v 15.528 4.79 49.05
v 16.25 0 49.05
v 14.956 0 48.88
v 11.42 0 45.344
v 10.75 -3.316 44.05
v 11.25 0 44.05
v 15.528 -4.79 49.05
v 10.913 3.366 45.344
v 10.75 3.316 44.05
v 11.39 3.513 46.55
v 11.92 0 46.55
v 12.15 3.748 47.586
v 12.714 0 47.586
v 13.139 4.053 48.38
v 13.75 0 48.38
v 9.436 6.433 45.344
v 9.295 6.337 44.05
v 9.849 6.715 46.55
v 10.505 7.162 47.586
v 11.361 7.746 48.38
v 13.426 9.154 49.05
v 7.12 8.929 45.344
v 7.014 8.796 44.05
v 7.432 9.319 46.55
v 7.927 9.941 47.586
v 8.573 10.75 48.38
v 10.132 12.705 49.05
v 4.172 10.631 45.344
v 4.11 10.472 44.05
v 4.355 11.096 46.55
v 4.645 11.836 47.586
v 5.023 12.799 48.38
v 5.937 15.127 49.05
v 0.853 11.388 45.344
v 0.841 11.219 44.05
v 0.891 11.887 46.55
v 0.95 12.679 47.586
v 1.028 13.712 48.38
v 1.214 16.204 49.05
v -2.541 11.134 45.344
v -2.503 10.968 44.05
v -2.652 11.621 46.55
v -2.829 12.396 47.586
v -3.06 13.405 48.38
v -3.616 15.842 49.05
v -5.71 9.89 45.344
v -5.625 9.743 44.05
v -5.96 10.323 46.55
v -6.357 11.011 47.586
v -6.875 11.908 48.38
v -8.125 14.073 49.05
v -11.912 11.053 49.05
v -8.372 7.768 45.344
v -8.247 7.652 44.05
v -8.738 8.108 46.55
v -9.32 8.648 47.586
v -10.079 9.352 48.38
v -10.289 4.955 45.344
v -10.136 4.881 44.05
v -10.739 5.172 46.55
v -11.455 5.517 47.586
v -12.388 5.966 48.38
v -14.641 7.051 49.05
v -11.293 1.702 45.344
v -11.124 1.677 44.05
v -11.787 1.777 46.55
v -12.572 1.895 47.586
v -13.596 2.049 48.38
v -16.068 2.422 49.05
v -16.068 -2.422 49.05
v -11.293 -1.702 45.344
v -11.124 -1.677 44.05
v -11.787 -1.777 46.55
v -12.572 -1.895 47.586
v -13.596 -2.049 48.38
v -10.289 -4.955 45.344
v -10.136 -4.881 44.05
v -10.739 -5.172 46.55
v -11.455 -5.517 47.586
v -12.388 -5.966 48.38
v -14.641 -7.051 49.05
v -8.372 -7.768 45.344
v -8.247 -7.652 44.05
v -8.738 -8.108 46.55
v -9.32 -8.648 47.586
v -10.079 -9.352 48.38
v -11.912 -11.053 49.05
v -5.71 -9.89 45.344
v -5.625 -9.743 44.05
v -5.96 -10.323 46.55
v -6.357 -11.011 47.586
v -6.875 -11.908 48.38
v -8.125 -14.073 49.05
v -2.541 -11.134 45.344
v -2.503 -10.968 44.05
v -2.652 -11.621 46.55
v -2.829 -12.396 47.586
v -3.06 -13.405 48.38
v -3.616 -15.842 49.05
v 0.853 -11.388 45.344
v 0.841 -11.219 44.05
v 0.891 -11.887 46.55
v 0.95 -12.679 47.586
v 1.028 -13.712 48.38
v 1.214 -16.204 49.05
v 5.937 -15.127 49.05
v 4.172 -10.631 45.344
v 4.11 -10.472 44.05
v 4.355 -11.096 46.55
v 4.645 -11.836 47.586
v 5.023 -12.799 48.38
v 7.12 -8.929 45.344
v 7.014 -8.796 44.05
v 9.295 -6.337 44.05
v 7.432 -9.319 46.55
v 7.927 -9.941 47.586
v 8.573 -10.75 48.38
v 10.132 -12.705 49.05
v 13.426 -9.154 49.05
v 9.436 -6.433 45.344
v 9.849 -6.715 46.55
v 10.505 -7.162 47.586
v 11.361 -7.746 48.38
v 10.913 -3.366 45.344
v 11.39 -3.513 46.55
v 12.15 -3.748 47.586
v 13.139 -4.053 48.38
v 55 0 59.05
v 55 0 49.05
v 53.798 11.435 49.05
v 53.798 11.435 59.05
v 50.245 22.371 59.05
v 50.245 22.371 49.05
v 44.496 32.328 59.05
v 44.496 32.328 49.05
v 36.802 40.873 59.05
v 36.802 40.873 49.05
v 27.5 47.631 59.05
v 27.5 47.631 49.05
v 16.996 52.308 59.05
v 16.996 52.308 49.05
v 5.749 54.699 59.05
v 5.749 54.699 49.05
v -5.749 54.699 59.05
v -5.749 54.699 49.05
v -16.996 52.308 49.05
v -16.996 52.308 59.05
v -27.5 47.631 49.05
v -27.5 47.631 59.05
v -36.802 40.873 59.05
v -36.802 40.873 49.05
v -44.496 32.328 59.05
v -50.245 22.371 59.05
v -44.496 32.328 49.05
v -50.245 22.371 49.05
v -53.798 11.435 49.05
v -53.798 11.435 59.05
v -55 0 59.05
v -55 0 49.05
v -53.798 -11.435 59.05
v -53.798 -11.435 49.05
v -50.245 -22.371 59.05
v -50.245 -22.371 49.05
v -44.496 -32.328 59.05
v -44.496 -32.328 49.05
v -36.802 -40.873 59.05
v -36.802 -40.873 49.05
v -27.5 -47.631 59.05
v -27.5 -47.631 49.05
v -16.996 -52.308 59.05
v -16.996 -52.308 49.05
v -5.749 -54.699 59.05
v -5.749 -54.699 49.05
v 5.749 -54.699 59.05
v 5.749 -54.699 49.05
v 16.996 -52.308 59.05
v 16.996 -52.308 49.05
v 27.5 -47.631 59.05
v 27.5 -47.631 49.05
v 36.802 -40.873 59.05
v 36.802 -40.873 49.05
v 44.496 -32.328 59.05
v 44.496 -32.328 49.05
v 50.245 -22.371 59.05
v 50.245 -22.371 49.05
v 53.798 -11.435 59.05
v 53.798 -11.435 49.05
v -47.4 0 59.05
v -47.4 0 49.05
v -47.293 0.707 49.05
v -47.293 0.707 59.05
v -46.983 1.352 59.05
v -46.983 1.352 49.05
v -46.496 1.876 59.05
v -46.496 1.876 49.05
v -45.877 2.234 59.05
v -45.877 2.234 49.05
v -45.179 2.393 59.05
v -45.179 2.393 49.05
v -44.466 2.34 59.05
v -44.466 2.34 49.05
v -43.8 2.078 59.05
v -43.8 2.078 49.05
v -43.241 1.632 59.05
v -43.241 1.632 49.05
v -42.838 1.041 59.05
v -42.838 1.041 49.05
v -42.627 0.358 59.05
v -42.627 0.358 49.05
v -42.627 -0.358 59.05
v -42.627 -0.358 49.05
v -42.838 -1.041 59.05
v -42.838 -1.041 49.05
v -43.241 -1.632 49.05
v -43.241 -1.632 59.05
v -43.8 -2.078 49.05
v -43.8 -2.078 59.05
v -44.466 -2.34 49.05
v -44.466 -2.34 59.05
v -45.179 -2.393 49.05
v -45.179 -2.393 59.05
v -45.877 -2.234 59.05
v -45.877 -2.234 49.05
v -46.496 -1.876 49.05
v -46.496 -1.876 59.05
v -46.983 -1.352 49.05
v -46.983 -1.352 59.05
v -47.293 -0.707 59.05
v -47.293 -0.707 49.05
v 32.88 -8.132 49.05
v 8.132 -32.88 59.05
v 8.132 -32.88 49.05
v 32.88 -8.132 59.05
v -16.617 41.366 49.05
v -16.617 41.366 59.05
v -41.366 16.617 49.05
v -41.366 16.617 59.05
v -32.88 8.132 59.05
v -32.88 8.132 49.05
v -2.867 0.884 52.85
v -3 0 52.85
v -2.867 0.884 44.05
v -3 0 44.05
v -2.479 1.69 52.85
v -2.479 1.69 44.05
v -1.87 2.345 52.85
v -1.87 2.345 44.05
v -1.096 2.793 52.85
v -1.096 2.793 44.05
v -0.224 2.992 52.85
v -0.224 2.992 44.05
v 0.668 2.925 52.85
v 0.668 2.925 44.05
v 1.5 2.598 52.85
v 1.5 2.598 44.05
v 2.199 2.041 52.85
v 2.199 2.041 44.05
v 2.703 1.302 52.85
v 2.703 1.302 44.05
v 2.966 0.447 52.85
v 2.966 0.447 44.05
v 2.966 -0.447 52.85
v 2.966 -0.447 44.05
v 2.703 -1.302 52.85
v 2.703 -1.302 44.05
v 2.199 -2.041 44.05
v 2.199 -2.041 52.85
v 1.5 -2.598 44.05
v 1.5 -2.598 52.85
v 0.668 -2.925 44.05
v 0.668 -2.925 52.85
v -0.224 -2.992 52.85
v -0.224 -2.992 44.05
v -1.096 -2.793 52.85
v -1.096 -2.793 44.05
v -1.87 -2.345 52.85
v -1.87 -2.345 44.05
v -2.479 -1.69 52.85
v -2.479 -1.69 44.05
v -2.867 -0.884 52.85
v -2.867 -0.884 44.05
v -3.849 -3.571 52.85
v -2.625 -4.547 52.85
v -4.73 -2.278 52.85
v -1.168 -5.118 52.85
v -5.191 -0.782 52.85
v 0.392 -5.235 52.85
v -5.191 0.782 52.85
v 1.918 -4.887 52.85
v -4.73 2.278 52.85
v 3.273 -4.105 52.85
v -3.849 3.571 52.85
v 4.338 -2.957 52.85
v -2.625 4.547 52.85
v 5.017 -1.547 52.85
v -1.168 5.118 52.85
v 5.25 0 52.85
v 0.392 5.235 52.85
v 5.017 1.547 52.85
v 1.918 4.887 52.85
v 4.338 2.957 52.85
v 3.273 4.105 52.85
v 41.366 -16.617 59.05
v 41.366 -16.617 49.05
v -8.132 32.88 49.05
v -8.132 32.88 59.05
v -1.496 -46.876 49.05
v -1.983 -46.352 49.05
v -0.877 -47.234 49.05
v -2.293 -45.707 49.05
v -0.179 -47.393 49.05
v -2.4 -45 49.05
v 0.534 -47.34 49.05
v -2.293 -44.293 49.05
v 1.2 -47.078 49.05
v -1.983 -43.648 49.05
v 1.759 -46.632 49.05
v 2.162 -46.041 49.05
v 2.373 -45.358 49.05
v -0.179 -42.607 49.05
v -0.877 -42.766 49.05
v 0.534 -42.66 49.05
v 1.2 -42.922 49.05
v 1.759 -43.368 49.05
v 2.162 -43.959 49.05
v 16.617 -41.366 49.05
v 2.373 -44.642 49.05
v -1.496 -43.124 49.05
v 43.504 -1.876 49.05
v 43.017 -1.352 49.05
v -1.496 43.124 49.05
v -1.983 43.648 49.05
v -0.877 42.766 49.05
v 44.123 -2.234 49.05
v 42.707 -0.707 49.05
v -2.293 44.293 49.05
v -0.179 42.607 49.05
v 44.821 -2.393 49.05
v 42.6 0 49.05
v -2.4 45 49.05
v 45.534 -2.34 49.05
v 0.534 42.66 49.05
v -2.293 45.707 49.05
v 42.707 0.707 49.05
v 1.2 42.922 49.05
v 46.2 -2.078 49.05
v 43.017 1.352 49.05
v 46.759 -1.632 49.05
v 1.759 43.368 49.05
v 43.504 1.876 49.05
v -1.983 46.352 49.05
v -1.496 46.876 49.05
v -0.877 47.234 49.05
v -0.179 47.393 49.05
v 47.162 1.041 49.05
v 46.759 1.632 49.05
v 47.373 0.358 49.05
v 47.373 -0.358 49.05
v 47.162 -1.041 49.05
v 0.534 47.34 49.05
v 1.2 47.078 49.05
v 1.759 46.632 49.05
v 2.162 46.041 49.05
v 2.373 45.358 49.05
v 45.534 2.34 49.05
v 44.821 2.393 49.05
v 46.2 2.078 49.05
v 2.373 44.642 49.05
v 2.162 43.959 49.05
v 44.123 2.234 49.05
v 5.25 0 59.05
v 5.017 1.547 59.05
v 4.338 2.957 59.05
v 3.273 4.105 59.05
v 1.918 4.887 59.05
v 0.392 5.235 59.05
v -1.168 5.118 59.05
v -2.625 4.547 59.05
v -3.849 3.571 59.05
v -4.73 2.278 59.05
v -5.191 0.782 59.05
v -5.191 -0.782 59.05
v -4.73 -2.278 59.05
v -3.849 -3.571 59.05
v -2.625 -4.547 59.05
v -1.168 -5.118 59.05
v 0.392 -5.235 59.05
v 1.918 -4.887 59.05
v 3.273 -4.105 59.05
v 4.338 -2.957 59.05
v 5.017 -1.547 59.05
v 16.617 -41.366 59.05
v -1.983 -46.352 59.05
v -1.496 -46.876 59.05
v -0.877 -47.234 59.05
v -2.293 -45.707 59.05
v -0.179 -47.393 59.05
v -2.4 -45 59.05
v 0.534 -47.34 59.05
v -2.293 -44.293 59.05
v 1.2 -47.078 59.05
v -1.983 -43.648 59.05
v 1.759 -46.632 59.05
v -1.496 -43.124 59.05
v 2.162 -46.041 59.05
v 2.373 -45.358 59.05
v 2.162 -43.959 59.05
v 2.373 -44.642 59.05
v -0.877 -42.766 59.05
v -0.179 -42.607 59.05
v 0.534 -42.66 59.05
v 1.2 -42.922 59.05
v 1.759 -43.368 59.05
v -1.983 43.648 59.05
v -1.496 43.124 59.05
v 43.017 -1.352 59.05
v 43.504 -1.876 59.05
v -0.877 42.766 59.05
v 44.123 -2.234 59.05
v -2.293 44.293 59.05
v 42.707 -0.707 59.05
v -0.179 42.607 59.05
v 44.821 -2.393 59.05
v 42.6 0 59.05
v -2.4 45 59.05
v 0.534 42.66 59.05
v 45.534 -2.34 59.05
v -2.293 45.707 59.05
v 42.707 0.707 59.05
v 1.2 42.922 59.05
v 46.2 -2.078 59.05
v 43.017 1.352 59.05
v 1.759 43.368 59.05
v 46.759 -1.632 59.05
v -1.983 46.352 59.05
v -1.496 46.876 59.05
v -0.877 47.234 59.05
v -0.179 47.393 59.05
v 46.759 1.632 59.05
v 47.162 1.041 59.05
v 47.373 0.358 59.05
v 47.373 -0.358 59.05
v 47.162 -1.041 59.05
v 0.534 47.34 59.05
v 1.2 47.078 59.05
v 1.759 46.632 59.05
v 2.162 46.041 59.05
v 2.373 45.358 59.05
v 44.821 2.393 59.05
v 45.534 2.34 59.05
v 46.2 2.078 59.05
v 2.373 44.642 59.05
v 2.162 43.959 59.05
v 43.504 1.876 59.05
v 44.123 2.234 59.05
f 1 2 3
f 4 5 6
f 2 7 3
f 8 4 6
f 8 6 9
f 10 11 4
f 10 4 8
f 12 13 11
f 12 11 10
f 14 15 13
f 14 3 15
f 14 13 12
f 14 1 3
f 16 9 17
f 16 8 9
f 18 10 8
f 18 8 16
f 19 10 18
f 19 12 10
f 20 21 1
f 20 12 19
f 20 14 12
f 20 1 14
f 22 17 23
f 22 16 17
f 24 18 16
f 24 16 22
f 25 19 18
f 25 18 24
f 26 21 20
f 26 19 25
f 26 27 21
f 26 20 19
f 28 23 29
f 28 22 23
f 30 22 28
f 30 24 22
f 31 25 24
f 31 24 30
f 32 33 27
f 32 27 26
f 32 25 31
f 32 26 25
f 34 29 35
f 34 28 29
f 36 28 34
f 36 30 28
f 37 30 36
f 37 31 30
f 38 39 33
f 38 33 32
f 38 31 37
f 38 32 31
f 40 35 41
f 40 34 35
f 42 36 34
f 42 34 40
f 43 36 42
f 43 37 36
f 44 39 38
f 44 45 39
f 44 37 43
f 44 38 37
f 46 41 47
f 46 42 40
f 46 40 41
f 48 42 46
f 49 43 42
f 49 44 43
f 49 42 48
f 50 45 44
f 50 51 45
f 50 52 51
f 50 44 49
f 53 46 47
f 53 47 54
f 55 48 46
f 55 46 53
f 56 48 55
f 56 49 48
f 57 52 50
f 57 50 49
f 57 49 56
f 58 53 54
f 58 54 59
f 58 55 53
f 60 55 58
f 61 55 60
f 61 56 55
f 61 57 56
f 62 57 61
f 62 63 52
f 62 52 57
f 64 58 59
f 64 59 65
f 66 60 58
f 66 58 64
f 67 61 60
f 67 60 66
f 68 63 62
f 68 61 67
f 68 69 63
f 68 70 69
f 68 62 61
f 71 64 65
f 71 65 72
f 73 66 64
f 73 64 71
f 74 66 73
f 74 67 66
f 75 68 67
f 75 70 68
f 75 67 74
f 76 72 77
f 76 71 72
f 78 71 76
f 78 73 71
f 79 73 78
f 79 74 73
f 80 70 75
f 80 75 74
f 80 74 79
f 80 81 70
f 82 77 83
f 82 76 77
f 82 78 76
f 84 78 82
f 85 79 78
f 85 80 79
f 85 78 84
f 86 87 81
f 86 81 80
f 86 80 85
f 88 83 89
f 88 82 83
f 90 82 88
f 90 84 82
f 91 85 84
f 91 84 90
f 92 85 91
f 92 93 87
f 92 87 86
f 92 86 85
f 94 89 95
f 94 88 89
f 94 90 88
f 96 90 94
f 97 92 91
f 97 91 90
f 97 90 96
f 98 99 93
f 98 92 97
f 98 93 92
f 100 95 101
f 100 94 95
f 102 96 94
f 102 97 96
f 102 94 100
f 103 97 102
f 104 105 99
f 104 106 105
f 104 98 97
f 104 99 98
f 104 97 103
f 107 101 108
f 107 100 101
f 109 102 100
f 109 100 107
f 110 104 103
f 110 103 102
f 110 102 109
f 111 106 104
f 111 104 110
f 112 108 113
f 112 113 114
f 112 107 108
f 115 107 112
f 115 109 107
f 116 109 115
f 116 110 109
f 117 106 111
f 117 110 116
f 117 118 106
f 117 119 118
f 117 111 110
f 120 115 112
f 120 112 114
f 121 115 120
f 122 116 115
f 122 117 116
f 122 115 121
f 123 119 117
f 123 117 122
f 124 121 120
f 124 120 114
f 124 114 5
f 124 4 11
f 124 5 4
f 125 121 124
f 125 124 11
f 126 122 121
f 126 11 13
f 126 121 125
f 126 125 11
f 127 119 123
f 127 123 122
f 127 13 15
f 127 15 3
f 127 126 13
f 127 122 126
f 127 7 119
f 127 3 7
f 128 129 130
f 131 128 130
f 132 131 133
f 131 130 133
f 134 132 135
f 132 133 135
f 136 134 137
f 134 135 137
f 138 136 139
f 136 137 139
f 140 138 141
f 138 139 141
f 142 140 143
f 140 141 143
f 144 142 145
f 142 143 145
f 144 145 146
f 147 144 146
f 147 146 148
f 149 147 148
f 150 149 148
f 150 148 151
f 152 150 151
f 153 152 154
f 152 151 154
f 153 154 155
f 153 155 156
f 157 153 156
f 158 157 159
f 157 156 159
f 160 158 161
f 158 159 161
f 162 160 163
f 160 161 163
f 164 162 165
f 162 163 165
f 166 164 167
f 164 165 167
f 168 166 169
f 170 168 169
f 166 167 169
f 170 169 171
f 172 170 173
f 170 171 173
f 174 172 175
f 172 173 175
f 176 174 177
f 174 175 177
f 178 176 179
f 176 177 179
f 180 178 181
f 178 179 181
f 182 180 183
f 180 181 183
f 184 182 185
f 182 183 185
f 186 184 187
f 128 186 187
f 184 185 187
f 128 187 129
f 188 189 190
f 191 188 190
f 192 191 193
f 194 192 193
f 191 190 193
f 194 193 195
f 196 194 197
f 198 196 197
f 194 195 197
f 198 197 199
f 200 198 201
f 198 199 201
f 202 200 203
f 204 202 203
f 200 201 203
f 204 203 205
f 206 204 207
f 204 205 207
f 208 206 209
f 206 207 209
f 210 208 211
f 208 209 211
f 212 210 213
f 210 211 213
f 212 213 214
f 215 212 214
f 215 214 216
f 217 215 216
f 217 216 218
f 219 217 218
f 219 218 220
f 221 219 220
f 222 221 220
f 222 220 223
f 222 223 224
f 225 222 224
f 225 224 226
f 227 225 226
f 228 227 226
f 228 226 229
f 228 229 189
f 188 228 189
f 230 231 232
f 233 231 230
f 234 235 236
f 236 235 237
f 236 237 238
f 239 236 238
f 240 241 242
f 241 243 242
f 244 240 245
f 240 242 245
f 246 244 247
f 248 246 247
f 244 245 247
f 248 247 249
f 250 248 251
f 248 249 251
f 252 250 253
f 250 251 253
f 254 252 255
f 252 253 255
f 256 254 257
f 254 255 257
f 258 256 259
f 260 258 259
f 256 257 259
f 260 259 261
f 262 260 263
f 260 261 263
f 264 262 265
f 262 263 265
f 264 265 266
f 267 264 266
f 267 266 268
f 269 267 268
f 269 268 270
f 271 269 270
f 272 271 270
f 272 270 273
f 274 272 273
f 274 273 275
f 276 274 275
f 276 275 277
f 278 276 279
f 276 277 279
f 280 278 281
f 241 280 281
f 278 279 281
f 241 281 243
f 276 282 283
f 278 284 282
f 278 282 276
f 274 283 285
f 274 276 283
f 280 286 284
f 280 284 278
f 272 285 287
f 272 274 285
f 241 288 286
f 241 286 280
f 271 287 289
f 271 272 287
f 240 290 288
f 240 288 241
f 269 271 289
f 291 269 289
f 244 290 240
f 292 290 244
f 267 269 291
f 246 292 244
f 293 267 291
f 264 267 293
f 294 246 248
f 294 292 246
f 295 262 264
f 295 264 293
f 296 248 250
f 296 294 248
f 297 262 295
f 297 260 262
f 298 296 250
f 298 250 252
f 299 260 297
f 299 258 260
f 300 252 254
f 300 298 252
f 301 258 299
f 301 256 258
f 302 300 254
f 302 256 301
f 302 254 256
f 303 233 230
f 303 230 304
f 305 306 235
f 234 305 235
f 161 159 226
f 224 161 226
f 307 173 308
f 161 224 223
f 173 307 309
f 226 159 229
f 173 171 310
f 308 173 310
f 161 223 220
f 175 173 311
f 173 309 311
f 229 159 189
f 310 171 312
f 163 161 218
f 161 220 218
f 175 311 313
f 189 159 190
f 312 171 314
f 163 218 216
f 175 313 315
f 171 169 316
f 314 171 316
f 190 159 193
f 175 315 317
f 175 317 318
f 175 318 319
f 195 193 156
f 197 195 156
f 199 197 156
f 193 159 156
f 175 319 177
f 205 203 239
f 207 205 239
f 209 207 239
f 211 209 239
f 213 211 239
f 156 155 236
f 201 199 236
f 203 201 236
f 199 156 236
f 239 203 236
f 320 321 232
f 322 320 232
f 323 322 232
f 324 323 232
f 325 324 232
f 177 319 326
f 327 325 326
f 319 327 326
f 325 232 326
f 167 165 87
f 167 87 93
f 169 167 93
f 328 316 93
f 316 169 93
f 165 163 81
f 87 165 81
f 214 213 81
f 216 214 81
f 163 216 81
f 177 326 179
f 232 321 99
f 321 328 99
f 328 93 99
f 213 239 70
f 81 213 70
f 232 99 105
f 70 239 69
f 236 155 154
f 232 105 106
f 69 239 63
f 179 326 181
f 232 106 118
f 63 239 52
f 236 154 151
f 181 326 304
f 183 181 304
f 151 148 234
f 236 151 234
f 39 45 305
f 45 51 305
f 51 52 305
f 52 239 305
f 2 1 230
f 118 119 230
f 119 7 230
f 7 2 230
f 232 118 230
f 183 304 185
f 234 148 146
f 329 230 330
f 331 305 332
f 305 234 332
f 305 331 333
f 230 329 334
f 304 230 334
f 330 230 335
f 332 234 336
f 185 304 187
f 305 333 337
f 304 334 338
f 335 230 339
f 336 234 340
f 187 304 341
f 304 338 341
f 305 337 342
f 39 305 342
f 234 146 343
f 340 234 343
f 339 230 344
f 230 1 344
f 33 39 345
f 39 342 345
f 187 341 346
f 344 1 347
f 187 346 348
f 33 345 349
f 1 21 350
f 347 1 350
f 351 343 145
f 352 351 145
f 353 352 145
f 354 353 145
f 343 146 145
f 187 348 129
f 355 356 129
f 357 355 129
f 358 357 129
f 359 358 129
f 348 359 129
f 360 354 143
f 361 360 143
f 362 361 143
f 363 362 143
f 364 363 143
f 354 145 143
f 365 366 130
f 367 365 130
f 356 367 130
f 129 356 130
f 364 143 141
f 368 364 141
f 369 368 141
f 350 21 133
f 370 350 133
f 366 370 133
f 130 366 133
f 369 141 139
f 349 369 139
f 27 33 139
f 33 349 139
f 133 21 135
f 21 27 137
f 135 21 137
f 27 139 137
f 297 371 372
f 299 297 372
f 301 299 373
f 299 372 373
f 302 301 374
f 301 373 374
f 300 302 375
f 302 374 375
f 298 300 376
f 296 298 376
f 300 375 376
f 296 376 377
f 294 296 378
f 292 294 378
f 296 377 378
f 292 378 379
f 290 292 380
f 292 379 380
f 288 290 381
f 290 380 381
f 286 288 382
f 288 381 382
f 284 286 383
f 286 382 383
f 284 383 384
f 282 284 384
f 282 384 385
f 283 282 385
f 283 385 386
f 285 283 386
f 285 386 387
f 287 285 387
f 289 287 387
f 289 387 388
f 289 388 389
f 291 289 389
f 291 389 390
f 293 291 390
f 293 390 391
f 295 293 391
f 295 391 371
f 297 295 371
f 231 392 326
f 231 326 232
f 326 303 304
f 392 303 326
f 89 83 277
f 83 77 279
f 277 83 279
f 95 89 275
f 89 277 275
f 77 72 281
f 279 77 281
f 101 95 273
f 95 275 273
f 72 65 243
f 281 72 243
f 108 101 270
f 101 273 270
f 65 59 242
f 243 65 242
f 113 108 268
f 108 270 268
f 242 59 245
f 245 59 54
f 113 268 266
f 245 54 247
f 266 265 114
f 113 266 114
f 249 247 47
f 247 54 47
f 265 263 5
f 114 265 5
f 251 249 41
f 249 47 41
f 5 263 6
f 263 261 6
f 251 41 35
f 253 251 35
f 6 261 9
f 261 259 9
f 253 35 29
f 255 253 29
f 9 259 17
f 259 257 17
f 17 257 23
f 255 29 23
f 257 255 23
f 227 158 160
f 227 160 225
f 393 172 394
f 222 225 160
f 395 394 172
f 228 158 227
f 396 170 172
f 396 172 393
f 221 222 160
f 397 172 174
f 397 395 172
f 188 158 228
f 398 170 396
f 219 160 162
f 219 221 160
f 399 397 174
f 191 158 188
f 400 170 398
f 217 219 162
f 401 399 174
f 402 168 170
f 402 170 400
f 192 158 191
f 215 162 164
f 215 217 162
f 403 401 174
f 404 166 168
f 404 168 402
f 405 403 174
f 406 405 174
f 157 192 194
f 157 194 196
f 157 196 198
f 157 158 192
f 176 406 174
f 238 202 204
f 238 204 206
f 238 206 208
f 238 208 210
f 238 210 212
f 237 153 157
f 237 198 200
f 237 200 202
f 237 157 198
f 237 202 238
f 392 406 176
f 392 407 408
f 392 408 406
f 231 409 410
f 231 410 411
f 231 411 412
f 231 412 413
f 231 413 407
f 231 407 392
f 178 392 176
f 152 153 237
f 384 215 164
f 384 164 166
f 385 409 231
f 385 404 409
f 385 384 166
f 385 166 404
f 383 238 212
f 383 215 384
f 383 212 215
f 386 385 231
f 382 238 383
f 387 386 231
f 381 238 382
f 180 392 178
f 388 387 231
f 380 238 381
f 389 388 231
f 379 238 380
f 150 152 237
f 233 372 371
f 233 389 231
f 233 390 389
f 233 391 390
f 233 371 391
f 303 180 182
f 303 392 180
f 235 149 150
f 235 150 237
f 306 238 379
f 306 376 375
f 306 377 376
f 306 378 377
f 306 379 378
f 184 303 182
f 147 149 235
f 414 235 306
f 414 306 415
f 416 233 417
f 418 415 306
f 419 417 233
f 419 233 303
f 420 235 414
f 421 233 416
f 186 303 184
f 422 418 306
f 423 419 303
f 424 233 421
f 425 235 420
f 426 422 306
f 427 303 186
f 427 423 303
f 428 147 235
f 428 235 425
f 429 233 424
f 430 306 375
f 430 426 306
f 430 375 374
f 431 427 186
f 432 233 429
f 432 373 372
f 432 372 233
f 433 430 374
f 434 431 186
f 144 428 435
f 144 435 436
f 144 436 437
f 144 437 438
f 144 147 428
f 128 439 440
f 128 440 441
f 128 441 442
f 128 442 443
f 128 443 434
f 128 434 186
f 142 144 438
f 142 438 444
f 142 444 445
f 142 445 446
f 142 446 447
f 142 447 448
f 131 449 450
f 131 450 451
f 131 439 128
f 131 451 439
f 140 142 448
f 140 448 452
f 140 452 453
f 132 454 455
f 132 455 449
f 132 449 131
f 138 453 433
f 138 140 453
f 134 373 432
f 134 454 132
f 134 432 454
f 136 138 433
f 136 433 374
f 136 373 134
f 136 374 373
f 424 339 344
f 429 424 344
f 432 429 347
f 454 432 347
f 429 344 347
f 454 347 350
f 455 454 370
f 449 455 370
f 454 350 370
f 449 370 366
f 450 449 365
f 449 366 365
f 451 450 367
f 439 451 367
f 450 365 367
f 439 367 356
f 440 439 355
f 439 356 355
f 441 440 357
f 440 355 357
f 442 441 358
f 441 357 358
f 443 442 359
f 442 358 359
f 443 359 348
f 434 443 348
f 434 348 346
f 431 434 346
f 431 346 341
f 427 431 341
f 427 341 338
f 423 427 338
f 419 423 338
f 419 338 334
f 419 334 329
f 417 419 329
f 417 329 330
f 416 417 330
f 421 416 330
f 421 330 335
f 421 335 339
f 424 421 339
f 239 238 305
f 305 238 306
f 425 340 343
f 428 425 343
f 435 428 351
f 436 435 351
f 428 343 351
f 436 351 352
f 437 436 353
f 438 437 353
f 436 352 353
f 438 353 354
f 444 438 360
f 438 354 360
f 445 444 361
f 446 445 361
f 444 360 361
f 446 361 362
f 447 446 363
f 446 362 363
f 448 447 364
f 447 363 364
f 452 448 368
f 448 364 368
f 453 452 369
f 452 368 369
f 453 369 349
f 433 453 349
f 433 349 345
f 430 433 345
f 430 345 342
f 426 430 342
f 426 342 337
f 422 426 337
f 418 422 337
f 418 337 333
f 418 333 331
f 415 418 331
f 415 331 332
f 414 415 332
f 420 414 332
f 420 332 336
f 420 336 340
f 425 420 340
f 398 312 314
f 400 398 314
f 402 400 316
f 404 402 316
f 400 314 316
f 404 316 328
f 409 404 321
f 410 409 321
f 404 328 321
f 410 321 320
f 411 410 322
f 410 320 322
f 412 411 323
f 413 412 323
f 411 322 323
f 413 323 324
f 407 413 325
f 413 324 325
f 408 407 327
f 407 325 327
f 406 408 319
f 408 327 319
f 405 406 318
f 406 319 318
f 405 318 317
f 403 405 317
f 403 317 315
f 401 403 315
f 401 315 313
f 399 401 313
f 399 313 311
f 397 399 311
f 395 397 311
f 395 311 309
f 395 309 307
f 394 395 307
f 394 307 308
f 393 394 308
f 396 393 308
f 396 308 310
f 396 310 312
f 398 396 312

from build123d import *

# Parameters (mm, degrees)
SKETCH1_R                               = 7.5
BOSS_EXTRUDE1_DEPTH                     = 20.05
SKETCH3_W                               = 5
SKETCH3_H                               = 5
CUT_EXTRUDE1_DEPTH                      = 21
SKETCH6_R                               = 8.5
BOSS_EXTRUDE2_DEPTH                     = 24
SKETCH7_R                               = 11.25
BOSS_EXTRUDE3_DEPTH                     = 5
SKETCH8_R                               = 55
BOSS_EXTRUDE4_DEPTH                     = 10
FILLET1_R                               = 0.6
FILLET2_R                               = 5
M4_CLEARANCE_HOLE1_D                    = 4.8
M6X1_0_TAPPED_HOLE2_D                   = 5
M6X1_0_TAPPED_HOLE2_DEPTH               = 23.497848452
M6X1_0_TAPPED_HOLE2_TIP                 = 1.502151548
SKETCH13_R                              = 7.5
CUT_EXTRUDE2_DEPTH                      = 2
CUT_EXTRUDE3_REACH                      = 98.461
SKETCH15_R                              = 36.682415144
CUT_EXTRUDE4_DEPTH                      = 42.05
CBORE_FOR_M6_HEX_HEAD_BOLT1_D           = 6
CBORE_FOR_M6_HEX_HEAD_BOLT1_CBORE_D     = 10.5
CBORE_FOR_M6_HEX_HEAD_BOLT1_CBORE_DEPTH = 6.2


with BuildPart() as part:
    # Sketch1 → Boss-Extrude1 (new body)
    with BuildSketch(Plane.XY):
        Circle(SKETCH1_R)
    extrude(amount=BOSS_EXTRUDE1_DEPTH)

    # Sketch3 → Cut-Extrude1 (cut)
    with BuildSketch(Plane(origin=(0, 0, 0), x_dir=(-1, 0, 0), z_dir=(0, 0, -1))):
        with Locations((0, 7.5)):
            Rectangle(SKETCH3_W, SKETCH3_H)
    extrude(amount=-CUT_EXTRUDE1_DEPTH, mode=Mode.SUBTRACT)

    # Sketch6 → Boss-Extrude2 (add)
    with BuildSketch(Plane.XY.offset(20.05)):
        Circle(SKETCH6_R)
    extrude(amount=BOSS_EXTRUDE2_DEPTH)

    # Sketch7 → Boss-Extrude3 (add)
    with BuildSketch(Plane.XY.offset(44.05)):
        Circle(SKETCH7_R)
    extrude(amount=BOSS_EXTRUDE3_DEPTH)

    # Sketch8 → Boss-Extrude4 (add)
    with BuildSketch(Plane.XY.offset(49.05)):
        Circle(SKETCH8_R)
    extrude(amount=BOSS_EXTRUDE4_DEPTH)

    # Fillet1
    fillet1_edges = [part.edges().sort_by_distance(p)[0] for p in [
        (-8.5, 0, 44.05),
    ]]
    fillet(fillet1_edges, radius=FILLET1_R)

    # Fillet2
    fillet2_edges = [part.edges().sort_by_distance(p)[0] for p in [
        (-11.25, 0, 49.05),
    ]]
    fillet(fillet2_edges, radius=FILLET2_R - 0.0001)  # a hair under: the kernel refuses the full size

    # M4 Clearance Hole1 (through all)
    with Locations(Plane.XY.offset(59.05)):
        with Locations((0, 45), (0, -45), (45, 0), (-45, 0)):
            Hole(M4_CLEARANCE_HOLE1_D / 2)

    # M6x1.0 Tapped Hole2
    with Locations(Plane(origin=(0, 0, 0), x_dir=(-1, 0, 0), z_dir=(0, 0, -1))):
        with Locations((0, 0)):
            Hole(M6X1_0_TAPPED_HOLE2_D / 2, depth=M6X1_0_TAPPED_HOLE2_DEPTH)
            with Locations((0, 0, -(M6X1_0_TAPPED_HOLE2_DEPTH + M6X1_0_TAPPED_HOLE2_TIP / 2))):  # 118° drill point
                Cone(0, M6X1_0_TAPPED_HOLE2_D / 2, M6X1_0_TAPPED_HOLE2_TIP, mode=Mode.SUBTRACT)

    # Sketch13 → Cut-Extrude2 (cut)
    with BuildSketch(Plane(origin=(0, 0, 0), x_dir=(-1, 0, 0), z_dir=(0, 0, -1))):
        Circle(SKETCH13_R)
    extrude(amount=-CUT_EXTRUDE2_DEPTH, mode=Mode.SUBTRACT)

    # Sketch14 → Cut-Extrude3 (cut, up to next)
    with BuildSketch(Plane.XY.offset(59.05), mode=Mode.PRIVATE) as cut_extrude3_sk1:
        Polygon((-16.617009358, 41.365746699), (-41.365746699, 16.617009358), (-32.880465325, 8.131727984), (-8.131727984, 32.880465325), align=None)
    cut_extrude3_tool1 = extrude(cut_extrude3_sk1.sketch, amount=-CUT_EXTRUDE3_REACH, mode=Mode.PRIVATE) & part.part
    # Sketch14 → Cut-Extrude3 (cut, up to next)
    with BuildSketch(Plane.XY.offset(59.05), mode=Mode.PRIVATE) as cut_extrude3_sk2:
        Polygon((41.365746699, -16.617009358), (16.617009358, -41.365746699), (8.131727984, -32.880465325), (32.880465325, -8.131727984), align=None)
    cut_extrude3_tool2 = extrude(cut_extrude3_sk2.sketch, amount=-CUT_EXTRUDE3_REACH, mode=Mode.PRIVATE) & part.part
    add(cut_extrude3_tool1.solids().sort_by_distance((-24.748737, 24.748737, 59.05))[0], mode=Mode.SUBTRACT)
    add(cut_extrude3_tool2.solids().sort_by_distance((24.748737, -24.748737, 59.05))[0], mode=Mode.SUBTRACT)

    # Sketch15 → Cut-Extrude4 (cut)
    with BuildSketch(Plane(origin=(0, 0, 2), x_dir=(-1, 0, 0), z_dir=(0, 0, -1))):
        Circle(SKETCH15_R)
    extrude(amount=-CUT_EXTRUDE4_DEPTH, mode=Mode.SUBTRACT)

    # CBORE for M6 Hex Head Bolt1 (through all)
    with Locations(Plane.XY.offset(59.05)):
        with Locations((0, 0)):
            CounterBoreHole(CBORE_FOR_M6_HEX_HEAD_BOLT1_D / 2, CBORE_FOR_M6_HEX_HEAD_BOLT1_CBORE_D / 2, CBORE_FOR_M6_HEX_HEAD_BOLT1_CBORE_DEPTH)


solid = part.part
